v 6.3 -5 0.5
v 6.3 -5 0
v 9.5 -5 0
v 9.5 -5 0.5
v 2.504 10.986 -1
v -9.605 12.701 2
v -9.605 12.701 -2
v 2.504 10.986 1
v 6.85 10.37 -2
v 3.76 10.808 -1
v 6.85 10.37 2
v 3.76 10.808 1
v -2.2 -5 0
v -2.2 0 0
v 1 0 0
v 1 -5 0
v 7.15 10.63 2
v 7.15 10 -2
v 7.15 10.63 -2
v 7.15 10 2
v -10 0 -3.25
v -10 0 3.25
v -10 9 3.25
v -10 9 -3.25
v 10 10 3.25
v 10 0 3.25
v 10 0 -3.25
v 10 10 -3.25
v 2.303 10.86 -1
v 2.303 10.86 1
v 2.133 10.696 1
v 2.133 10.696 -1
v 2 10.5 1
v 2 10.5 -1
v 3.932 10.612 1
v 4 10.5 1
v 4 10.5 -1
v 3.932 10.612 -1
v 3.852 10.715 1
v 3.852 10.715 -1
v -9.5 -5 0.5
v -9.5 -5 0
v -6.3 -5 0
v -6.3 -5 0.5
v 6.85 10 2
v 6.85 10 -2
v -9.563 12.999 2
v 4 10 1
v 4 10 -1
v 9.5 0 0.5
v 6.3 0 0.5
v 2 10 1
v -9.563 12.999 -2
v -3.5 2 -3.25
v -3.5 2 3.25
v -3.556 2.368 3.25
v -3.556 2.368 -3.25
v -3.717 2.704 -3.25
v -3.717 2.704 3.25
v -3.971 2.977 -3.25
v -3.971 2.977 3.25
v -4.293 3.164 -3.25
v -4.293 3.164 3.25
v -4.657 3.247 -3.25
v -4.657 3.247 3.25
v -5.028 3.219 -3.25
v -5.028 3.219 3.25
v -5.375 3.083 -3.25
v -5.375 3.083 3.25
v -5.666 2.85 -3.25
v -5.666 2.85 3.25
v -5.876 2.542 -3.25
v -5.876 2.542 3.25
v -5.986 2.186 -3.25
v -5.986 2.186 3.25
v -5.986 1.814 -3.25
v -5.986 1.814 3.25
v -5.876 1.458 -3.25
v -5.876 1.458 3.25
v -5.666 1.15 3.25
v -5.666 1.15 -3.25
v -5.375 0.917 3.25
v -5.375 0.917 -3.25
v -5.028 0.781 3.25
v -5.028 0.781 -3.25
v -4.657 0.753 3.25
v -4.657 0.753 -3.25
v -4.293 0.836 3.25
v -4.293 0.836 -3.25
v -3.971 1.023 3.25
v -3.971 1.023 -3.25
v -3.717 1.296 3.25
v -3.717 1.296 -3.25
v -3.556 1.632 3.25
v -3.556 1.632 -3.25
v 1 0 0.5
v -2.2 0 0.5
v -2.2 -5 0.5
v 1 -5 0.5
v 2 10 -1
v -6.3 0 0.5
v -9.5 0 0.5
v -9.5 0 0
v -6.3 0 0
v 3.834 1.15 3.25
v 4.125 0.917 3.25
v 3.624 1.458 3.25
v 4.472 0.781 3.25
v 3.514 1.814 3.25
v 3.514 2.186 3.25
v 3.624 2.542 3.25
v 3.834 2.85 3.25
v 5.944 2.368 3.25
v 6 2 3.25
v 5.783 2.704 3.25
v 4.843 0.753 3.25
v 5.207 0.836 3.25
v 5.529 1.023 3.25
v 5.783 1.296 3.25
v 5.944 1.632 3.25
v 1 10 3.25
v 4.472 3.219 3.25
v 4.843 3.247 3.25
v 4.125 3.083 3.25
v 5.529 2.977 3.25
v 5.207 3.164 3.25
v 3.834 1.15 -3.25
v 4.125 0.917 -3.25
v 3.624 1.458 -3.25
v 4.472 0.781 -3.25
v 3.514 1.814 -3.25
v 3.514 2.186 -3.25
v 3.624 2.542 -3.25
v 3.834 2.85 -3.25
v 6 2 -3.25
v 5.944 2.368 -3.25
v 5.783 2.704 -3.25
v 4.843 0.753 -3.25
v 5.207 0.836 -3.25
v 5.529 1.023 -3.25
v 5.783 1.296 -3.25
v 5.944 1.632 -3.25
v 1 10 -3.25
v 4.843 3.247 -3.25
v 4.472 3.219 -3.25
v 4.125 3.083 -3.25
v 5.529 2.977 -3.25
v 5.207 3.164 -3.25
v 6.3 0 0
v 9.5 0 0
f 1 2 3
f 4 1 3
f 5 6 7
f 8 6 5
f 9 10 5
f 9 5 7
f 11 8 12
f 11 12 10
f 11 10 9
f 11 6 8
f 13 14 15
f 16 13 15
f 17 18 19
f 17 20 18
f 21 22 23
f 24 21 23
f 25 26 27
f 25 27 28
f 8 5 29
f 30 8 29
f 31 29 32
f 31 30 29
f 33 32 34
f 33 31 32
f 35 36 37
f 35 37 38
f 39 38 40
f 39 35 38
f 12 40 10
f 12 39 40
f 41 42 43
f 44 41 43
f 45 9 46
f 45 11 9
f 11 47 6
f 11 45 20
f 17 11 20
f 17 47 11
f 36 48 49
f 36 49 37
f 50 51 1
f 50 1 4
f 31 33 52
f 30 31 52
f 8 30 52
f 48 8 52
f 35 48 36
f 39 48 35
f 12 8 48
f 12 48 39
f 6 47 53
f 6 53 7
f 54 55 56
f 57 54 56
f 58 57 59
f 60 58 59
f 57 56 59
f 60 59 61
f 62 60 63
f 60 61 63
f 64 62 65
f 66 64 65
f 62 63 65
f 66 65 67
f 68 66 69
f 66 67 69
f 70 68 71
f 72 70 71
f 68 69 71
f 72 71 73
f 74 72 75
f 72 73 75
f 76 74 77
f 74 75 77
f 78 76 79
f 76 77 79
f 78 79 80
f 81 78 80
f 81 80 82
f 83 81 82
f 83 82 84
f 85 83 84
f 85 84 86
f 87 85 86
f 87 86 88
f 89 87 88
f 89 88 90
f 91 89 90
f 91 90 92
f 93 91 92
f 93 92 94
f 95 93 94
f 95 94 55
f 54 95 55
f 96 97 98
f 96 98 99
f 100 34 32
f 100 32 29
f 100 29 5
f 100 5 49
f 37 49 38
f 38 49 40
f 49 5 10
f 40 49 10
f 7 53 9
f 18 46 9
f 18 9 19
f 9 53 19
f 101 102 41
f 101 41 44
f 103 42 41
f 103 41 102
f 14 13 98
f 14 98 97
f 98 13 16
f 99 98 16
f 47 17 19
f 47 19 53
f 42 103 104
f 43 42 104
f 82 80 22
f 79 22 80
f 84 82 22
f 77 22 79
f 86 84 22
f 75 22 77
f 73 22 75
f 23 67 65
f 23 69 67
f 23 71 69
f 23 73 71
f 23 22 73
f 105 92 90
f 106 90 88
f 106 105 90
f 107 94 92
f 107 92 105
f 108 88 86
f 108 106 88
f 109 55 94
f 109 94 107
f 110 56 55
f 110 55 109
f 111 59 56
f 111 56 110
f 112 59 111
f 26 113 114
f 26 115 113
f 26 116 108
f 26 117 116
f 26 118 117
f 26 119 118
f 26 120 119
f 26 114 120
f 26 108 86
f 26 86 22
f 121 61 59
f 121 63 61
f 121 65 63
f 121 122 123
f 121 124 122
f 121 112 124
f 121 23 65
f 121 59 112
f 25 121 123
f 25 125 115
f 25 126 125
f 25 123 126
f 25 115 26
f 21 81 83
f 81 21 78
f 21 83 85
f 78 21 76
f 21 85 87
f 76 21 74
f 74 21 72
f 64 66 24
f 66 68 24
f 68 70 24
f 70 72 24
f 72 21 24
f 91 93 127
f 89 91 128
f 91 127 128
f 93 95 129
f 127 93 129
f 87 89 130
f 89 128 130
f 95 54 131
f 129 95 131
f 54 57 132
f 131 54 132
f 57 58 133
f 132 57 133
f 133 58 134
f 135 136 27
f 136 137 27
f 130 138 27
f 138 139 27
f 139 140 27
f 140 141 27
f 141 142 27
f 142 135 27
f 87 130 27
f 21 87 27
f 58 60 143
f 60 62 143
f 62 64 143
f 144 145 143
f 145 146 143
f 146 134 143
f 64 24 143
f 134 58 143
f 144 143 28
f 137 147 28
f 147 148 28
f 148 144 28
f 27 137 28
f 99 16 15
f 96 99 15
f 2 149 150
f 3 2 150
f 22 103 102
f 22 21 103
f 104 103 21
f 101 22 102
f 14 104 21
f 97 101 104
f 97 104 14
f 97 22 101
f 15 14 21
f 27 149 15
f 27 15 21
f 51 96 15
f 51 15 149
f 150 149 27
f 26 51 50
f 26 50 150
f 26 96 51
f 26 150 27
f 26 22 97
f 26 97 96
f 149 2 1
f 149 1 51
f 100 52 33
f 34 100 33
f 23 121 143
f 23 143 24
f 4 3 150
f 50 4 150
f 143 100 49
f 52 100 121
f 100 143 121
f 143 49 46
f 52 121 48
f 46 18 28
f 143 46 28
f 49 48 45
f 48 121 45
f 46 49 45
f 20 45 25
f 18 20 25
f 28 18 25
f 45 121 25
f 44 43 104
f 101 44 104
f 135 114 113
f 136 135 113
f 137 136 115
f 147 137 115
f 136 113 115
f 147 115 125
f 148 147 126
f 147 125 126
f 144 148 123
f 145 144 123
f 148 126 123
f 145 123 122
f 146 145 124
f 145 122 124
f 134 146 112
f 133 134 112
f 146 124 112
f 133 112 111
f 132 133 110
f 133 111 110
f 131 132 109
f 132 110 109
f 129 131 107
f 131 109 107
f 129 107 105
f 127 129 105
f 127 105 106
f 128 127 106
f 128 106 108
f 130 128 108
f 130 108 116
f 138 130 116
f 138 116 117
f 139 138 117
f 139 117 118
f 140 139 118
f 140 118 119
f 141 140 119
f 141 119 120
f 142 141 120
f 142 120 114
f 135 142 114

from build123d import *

# Parameters (mm, degrees)
SKETCH1_W                   = 20
SKETCH1_H                   = 10
BOSS_BODY_DEPTH             = 3.25
CUT_TOP_ANGLE_DEPTH         = 7.5
SKETCH3_W                   = 2
SKETCH3_H                   = 0.5
BOSS_BUTTON_DEPTH           = 1
BOSS_BUTTON_ROUND_TOP_DEPTH = 1
SKETCH5_R                   = 1.25
CUT_EXTRUDE2_DEPTH          = 7.5
SKETCH6_W                   = 3.2
SKETCH6_H                   = 5
BOSS_EXTRUDE4_DEPTH         = 0.5
EXTRUDE_THIN1_DEPTH         = 2


with BuildPart() as part:
    # Sketch1 → Boss-Body (new body, symmetric)
    with BuildSketch(Plane.XY):
        with Locations((0, 5)):
            Rectangle(SKETCH1_W, SKETCH1_H)
    extrude(amount=BOSS_BODY_DEPTH, both=True)

    # Sketch2 → Cut-Top Angle (cut, through all)
    with BuildSketch(Plane.XY.offset(3.25)):
        Polygon((1, 10), (-10, 9), (-10, 10), align=None)
    extrude(amount=-CUT_TOP_ANGLE_DEPTH, mode=Mode.SUBTRACT)

    # Sketch3 → Boss-Button (add, symmetric)
    with BuildSketch(Plane.XY):
        with Locations((3, 10.25)):
            Rectangle(SKETCH3_W, SKETCH3_H)
    extrude(amount=BOSS_BUTTON_DEPTH, both=True)

    # Sketch4 → Boss-Button Round Top (add, symmetric)
    with BuildSketch(Plane.XY):
        with BuildLine():
            Line((2, 10.5), (4, 10.5))
            ThreePointArc((4, 10.5), (3, 11.1), (2, 10.5))
        make_face()
    extrude(amount=BOSS_BUTTON_ROUND_TOP_DEPTH, both=True)

    # Sketch5 → Cut-Extrude2 (cut, through all)
    with BuildSketch(Plane.XY.offset(3.25)):
        with Locations((-4.75, 2)):
            Circle(SKETCH5_R)
        with Locations((4.75, 2)):
            Circle(SKETCH5_R)
    extrude(amount=-CUT_EXTRUDE2_DEPTH, mode=Mode.SUBTRACT)

    # Sketch6 → Boss-Extrude4 (add)
    with BuildSketch(Plane.XY):
        with Locations((-7.9, -2.5)):
            Rectangle(SKETCH6_W, SKETCH6_H)
        with Locations((7.9, -2.5)):
            Rectangle(SKETCH6_W, SKETCH6_H)
        with Locations((-0.6, -2.5)):
            Rectangle(SKETCH6_W, SKETCH6_H)
    extrude(amount=BOSS_EXTRUDE4_DEPTH)

    # Sketch7 → Extrude-Thin1 (add, symmetric)
    with BuildSketch(Plane.XY):
        Polygon((7.15, 10), (7.15, 10.630243429), (-9.563285177, 12.998516388), (-9.605374729, 12.701483612), (6.85, 10.369756571), (6.85, 10), align=None)
    extrude(amount=EXTRUDE_THIN1_DEPTH, both=True)


solid = part.part
